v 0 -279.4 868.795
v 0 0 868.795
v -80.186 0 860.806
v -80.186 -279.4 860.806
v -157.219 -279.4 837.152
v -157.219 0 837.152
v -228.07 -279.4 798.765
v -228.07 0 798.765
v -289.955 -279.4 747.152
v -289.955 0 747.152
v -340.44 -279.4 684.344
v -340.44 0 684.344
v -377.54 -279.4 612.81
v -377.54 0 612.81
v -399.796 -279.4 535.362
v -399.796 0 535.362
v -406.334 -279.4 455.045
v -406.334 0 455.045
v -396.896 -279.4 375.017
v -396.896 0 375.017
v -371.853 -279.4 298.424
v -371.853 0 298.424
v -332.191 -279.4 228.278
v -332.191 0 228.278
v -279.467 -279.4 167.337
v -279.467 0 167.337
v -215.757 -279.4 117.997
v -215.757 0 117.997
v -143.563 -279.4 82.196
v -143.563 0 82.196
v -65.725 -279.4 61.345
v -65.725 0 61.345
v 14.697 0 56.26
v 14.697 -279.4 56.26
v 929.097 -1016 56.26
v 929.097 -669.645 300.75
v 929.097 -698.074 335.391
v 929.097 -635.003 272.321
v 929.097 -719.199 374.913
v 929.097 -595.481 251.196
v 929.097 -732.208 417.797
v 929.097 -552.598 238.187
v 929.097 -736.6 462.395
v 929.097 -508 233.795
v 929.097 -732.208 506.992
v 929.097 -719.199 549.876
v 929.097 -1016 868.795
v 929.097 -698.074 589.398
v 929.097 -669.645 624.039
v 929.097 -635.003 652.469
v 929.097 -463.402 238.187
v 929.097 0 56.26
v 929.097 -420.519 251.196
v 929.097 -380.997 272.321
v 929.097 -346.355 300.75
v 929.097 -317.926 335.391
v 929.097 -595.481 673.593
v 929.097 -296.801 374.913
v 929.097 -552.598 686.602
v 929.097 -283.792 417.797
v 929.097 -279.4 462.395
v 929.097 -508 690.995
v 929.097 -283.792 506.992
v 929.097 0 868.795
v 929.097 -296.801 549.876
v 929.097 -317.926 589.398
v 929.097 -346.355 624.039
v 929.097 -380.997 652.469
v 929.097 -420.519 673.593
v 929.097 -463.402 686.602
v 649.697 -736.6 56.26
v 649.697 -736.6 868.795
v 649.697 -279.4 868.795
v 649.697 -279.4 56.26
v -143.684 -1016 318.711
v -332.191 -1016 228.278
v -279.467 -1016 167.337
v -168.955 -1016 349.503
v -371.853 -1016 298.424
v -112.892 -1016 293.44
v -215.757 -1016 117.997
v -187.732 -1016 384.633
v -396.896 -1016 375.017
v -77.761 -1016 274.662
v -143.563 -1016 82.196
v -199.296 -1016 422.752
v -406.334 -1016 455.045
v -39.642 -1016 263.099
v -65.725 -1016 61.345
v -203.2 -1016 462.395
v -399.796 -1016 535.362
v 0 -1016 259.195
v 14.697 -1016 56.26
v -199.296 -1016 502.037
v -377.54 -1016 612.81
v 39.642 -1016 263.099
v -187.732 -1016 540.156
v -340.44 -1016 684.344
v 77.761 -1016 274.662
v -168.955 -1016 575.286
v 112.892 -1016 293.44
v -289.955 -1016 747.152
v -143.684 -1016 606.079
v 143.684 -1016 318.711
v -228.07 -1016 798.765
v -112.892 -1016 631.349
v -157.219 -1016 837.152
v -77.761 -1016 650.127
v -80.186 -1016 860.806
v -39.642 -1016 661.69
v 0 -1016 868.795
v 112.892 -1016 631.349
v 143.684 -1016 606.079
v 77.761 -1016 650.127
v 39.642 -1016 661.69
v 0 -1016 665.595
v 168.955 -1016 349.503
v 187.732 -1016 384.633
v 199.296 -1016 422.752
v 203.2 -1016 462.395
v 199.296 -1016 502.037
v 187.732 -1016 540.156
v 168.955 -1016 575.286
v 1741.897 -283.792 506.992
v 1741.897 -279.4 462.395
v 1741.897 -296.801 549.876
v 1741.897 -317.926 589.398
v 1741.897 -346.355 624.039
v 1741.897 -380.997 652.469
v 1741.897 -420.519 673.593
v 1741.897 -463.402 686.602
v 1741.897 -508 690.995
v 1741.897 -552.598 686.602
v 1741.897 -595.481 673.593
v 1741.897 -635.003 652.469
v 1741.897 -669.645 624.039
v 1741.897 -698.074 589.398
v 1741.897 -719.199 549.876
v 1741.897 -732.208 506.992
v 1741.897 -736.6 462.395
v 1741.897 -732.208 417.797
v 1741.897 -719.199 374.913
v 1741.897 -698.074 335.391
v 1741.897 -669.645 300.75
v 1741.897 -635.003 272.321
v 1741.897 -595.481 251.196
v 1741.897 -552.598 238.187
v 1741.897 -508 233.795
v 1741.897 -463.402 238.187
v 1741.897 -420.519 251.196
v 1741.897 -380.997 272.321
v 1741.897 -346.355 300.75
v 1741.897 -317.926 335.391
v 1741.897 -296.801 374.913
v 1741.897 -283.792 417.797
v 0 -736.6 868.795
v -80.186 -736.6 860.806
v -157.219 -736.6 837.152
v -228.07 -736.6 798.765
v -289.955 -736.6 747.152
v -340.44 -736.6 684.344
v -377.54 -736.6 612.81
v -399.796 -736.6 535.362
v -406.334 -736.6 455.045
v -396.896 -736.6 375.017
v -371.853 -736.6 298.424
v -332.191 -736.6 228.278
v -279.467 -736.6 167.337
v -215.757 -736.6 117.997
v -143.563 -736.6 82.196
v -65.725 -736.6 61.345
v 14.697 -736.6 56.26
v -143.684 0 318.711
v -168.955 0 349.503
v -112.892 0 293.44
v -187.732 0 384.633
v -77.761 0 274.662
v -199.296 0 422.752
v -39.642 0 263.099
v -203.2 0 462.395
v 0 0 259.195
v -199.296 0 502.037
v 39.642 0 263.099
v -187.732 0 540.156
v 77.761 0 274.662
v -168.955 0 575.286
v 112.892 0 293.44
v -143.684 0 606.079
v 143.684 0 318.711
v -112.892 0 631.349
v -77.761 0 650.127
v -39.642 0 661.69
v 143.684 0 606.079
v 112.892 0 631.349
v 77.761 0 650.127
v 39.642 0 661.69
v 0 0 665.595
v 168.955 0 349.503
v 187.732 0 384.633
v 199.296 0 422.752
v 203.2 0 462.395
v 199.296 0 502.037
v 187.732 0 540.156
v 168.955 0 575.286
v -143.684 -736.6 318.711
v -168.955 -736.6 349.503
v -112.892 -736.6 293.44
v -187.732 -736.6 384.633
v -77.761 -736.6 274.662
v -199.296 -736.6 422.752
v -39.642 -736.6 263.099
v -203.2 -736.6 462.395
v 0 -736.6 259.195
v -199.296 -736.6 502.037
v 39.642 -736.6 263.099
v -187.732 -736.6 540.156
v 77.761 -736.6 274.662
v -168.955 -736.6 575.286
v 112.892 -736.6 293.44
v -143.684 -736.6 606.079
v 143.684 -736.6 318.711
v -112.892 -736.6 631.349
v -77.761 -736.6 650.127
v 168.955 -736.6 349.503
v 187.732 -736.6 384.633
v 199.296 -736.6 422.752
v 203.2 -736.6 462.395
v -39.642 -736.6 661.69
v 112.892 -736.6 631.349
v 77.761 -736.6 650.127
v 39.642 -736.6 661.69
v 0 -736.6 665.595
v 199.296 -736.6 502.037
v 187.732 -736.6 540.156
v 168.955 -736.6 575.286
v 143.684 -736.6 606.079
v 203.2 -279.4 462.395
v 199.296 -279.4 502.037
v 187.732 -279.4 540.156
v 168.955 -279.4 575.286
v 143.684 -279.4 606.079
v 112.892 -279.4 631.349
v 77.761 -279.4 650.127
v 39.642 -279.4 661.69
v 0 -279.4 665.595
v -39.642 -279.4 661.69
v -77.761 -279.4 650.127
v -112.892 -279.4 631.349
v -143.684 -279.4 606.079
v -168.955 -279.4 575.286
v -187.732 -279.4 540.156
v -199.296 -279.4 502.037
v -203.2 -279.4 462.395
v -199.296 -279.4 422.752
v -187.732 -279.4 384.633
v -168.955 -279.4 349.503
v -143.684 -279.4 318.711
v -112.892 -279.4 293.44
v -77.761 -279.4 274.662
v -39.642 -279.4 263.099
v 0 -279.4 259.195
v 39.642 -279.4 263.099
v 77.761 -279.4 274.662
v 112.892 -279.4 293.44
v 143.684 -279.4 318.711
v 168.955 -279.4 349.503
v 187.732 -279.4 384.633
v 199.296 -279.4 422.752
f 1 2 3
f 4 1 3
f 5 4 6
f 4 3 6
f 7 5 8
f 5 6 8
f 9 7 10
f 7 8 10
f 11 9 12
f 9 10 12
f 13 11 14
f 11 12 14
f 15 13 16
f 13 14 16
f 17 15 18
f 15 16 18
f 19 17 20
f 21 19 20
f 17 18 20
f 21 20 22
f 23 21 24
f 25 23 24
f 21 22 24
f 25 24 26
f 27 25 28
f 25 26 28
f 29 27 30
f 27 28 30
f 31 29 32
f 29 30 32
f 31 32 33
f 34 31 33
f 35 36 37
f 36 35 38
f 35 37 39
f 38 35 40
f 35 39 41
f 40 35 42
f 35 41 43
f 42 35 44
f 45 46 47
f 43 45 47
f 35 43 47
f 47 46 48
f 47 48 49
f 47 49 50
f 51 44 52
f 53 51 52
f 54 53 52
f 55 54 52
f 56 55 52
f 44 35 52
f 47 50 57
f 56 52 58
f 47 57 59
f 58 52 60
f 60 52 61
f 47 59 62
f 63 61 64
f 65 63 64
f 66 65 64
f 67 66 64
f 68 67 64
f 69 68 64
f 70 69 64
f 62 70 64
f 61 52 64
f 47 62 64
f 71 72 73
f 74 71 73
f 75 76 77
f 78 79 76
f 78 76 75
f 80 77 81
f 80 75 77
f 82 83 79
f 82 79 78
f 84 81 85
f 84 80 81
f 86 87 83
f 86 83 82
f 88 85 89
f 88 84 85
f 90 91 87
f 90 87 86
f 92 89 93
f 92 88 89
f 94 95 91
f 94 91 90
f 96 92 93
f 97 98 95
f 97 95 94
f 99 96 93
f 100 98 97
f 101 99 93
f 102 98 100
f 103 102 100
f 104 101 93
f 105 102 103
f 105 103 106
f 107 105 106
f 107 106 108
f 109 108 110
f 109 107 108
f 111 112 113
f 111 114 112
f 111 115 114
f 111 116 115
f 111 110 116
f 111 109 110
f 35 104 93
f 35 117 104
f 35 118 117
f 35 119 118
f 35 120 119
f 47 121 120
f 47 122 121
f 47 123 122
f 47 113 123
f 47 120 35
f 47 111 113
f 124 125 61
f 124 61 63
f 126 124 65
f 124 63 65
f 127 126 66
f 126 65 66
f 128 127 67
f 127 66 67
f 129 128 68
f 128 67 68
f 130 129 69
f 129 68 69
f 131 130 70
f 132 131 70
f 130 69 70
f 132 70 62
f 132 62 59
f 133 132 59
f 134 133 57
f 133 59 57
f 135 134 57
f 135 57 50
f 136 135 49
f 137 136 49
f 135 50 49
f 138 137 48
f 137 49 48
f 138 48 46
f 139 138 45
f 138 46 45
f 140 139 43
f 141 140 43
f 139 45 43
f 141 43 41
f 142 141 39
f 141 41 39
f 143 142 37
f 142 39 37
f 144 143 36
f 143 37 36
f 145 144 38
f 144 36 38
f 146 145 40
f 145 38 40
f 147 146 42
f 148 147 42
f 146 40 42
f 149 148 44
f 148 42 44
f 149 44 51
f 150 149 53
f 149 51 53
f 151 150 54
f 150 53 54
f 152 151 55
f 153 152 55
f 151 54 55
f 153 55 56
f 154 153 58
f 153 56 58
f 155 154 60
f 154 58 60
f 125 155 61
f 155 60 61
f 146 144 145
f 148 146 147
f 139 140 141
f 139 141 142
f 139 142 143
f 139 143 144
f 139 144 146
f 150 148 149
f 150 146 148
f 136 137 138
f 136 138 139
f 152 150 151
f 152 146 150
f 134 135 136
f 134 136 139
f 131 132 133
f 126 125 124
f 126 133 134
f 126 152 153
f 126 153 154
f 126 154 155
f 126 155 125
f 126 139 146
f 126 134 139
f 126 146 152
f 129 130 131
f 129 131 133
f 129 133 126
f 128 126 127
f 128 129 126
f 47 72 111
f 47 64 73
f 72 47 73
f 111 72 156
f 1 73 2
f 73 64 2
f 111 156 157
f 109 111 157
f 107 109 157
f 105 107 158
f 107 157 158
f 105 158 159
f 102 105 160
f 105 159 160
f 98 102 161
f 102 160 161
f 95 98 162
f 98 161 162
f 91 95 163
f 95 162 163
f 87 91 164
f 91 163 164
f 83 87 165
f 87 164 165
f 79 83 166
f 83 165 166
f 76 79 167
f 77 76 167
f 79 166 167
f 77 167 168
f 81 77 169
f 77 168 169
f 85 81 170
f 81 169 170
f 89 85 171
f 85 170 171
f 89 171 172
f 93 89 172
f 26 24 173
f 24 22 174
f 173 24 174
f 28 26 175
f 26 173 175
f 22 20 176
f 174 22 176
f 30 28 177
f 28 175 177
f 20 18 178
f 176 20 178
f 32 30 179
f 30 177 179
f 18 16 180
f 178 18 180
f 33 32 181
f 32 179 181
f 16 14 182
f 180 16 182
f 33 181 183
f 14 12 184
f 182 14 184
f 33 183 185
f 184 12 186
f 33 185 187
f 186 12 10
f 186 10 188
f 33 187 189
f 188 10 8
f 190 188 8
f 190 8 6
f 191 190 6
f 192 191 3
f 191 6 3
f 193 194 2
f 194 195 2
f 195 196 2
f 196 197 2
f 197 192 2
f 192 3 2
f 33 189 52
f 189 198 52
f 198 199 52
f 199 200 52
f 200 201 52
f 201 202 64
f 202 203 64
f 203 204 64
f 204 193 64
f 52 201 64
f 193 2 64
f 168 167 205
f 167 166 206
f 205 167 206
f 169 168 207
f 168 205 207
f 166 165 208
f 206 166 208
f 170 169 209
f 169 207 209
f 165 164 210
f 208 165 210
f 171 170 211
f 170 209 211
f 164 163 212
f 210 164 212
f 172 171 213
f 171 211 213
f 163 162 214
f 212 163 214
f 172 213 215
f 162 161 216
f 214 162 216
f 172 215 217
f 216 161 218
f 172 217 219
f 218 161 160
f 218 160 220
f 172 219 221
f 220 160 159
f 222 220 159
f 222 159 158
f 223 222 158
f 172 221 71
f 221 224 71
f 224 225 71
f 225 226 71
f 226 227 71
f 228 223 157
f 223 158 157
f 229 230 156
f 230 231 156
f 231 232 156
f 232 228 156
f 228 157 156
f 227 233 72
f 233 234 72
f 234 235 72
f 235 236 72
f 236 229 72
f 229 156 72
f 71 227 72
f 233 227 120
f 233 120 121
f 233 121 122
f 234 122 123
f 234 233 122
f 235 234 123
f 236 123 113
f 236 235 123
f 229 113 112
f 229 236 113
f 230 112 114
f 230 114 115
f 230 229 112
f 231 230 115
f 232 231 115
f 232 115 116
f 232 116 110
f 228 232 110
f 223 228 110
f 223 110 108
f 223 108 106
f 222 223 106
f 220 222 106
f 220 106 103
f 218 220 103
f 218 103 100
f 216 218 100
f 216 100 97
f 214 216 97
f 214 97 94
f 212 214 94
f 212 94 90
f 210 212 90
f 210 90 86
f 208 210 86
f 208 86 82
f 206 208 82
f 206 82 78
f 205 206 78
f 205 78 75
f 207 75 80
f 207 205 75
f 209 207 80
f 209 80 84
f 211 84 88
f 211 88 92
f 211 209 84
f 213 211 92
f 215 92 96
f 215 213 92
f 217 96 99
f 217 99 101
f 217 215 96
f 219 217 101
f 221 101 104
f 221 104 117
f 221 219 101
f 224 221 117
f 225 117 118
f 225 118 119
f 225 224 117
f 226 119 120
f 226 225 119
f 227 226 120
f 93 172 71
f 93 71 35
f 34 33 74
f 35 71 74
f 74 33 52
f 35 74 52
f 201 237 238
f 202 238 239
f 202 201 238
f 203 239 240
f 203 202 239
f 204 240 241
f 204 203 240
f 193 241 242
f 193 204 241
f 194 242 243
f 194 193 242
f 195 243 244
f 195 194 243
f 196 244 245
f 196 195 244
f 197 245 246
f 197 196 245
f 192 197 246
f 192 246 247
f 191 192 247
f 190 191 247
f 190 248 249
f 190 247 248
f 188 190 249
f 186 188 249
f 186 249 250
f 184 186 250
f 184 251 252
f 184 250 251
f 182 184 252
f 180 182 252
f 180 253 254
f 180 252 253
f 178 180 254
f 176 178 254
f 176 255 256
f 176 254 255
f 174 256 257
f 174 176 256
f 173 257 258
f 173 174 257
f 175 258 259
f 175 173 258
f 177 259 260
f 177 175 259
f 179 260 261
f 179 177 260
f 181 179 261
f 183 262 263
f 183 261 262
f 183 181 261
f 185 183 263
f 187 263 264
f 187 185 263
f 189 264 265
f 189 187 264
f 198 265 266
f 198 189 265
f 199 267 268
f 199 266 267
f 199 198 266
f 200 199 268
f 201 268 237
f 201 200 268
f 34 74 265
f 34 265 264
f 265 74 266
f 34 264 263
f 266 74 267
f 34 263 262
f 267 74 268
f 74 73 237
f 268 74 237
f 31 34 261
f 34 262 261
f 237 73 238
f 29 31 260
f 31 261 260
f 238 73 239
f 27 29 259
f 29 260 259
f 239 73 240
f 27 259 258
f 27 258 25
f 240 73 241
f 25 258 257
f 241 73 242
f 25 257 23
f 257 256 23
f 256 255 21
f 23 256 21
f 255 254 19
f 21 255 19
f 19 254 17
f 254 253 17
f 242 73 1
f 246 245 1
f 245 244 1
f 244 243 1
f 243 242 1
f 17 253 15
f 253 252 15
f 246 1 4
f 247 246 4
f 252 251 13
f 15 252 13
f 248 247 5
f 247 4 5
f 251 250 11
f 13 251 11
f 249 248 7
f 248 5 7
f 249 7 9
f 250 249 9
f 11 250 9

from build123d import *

# Parameters (mm, degrees)
F0_R     = 203.2
F1_DEPTH = 1016
F2_R     = 228.6
F3_DEPTH = 812.8
F5_W     = 533.122748
F5_H     = 457.2
F6_DEPTH = 812.801
F5_W_2   = 649.697065
F7_DEPTH = 812.801


with BuildPart() as f1:
    # F0 (on Front) → F1 (new body)
    with BuildSketch(Plane.XZ):
        with BuildLine():
            Line((14.697065, 56.260465), (929.097065, 56.260465))
            Line((929.097065, 56.260465), (929.097065, 868.794625))
            Line((929.097065, 868.794625), (0, 868.794625))
            ThreePointArc((0, 868.794625), (-406.333535, 455.04489), (14.697065, 56.260465))
        make_face()
        with Locations((0, 462.394625)):
            Circle(F0_R, mode=Mode.SUBTRACT)
    extrude(amount=F1_DEPTH)

    # F2 (on face) → F3 (join)
    with BuildSketch(Plane.YZ.offset(929.097065)):
        with Locations((-508, 462.394625)):
            Circle(F2_R)
    extrude(amount=F3_DEPTH)

    # F5 (on face) → F6 (cut, through all)
    with BuildSketch(Plane.XY.offset(868.794625)):
        with Locations((-266.561374, -508)):
            Rectangle(F5_W, F5_H)
    extrude(amount=-F6_DEPTH, mode=Mode.SUBTRACT)

    # F5 (on face) → F7 (cut, through all)
    with BuildSketch(Plane.XY.offset(868.794625)):
        with Locations((324.848532, -508)):
            Rectangle(F5_W_2, F5_H)
        with Locations((-266.561374, -508)):
            Rectangle(F5_W, F5_H)
    extrude(amount=-F7_DEPTH, mode=Mode.SUBTRACT)


solid = f1.part
